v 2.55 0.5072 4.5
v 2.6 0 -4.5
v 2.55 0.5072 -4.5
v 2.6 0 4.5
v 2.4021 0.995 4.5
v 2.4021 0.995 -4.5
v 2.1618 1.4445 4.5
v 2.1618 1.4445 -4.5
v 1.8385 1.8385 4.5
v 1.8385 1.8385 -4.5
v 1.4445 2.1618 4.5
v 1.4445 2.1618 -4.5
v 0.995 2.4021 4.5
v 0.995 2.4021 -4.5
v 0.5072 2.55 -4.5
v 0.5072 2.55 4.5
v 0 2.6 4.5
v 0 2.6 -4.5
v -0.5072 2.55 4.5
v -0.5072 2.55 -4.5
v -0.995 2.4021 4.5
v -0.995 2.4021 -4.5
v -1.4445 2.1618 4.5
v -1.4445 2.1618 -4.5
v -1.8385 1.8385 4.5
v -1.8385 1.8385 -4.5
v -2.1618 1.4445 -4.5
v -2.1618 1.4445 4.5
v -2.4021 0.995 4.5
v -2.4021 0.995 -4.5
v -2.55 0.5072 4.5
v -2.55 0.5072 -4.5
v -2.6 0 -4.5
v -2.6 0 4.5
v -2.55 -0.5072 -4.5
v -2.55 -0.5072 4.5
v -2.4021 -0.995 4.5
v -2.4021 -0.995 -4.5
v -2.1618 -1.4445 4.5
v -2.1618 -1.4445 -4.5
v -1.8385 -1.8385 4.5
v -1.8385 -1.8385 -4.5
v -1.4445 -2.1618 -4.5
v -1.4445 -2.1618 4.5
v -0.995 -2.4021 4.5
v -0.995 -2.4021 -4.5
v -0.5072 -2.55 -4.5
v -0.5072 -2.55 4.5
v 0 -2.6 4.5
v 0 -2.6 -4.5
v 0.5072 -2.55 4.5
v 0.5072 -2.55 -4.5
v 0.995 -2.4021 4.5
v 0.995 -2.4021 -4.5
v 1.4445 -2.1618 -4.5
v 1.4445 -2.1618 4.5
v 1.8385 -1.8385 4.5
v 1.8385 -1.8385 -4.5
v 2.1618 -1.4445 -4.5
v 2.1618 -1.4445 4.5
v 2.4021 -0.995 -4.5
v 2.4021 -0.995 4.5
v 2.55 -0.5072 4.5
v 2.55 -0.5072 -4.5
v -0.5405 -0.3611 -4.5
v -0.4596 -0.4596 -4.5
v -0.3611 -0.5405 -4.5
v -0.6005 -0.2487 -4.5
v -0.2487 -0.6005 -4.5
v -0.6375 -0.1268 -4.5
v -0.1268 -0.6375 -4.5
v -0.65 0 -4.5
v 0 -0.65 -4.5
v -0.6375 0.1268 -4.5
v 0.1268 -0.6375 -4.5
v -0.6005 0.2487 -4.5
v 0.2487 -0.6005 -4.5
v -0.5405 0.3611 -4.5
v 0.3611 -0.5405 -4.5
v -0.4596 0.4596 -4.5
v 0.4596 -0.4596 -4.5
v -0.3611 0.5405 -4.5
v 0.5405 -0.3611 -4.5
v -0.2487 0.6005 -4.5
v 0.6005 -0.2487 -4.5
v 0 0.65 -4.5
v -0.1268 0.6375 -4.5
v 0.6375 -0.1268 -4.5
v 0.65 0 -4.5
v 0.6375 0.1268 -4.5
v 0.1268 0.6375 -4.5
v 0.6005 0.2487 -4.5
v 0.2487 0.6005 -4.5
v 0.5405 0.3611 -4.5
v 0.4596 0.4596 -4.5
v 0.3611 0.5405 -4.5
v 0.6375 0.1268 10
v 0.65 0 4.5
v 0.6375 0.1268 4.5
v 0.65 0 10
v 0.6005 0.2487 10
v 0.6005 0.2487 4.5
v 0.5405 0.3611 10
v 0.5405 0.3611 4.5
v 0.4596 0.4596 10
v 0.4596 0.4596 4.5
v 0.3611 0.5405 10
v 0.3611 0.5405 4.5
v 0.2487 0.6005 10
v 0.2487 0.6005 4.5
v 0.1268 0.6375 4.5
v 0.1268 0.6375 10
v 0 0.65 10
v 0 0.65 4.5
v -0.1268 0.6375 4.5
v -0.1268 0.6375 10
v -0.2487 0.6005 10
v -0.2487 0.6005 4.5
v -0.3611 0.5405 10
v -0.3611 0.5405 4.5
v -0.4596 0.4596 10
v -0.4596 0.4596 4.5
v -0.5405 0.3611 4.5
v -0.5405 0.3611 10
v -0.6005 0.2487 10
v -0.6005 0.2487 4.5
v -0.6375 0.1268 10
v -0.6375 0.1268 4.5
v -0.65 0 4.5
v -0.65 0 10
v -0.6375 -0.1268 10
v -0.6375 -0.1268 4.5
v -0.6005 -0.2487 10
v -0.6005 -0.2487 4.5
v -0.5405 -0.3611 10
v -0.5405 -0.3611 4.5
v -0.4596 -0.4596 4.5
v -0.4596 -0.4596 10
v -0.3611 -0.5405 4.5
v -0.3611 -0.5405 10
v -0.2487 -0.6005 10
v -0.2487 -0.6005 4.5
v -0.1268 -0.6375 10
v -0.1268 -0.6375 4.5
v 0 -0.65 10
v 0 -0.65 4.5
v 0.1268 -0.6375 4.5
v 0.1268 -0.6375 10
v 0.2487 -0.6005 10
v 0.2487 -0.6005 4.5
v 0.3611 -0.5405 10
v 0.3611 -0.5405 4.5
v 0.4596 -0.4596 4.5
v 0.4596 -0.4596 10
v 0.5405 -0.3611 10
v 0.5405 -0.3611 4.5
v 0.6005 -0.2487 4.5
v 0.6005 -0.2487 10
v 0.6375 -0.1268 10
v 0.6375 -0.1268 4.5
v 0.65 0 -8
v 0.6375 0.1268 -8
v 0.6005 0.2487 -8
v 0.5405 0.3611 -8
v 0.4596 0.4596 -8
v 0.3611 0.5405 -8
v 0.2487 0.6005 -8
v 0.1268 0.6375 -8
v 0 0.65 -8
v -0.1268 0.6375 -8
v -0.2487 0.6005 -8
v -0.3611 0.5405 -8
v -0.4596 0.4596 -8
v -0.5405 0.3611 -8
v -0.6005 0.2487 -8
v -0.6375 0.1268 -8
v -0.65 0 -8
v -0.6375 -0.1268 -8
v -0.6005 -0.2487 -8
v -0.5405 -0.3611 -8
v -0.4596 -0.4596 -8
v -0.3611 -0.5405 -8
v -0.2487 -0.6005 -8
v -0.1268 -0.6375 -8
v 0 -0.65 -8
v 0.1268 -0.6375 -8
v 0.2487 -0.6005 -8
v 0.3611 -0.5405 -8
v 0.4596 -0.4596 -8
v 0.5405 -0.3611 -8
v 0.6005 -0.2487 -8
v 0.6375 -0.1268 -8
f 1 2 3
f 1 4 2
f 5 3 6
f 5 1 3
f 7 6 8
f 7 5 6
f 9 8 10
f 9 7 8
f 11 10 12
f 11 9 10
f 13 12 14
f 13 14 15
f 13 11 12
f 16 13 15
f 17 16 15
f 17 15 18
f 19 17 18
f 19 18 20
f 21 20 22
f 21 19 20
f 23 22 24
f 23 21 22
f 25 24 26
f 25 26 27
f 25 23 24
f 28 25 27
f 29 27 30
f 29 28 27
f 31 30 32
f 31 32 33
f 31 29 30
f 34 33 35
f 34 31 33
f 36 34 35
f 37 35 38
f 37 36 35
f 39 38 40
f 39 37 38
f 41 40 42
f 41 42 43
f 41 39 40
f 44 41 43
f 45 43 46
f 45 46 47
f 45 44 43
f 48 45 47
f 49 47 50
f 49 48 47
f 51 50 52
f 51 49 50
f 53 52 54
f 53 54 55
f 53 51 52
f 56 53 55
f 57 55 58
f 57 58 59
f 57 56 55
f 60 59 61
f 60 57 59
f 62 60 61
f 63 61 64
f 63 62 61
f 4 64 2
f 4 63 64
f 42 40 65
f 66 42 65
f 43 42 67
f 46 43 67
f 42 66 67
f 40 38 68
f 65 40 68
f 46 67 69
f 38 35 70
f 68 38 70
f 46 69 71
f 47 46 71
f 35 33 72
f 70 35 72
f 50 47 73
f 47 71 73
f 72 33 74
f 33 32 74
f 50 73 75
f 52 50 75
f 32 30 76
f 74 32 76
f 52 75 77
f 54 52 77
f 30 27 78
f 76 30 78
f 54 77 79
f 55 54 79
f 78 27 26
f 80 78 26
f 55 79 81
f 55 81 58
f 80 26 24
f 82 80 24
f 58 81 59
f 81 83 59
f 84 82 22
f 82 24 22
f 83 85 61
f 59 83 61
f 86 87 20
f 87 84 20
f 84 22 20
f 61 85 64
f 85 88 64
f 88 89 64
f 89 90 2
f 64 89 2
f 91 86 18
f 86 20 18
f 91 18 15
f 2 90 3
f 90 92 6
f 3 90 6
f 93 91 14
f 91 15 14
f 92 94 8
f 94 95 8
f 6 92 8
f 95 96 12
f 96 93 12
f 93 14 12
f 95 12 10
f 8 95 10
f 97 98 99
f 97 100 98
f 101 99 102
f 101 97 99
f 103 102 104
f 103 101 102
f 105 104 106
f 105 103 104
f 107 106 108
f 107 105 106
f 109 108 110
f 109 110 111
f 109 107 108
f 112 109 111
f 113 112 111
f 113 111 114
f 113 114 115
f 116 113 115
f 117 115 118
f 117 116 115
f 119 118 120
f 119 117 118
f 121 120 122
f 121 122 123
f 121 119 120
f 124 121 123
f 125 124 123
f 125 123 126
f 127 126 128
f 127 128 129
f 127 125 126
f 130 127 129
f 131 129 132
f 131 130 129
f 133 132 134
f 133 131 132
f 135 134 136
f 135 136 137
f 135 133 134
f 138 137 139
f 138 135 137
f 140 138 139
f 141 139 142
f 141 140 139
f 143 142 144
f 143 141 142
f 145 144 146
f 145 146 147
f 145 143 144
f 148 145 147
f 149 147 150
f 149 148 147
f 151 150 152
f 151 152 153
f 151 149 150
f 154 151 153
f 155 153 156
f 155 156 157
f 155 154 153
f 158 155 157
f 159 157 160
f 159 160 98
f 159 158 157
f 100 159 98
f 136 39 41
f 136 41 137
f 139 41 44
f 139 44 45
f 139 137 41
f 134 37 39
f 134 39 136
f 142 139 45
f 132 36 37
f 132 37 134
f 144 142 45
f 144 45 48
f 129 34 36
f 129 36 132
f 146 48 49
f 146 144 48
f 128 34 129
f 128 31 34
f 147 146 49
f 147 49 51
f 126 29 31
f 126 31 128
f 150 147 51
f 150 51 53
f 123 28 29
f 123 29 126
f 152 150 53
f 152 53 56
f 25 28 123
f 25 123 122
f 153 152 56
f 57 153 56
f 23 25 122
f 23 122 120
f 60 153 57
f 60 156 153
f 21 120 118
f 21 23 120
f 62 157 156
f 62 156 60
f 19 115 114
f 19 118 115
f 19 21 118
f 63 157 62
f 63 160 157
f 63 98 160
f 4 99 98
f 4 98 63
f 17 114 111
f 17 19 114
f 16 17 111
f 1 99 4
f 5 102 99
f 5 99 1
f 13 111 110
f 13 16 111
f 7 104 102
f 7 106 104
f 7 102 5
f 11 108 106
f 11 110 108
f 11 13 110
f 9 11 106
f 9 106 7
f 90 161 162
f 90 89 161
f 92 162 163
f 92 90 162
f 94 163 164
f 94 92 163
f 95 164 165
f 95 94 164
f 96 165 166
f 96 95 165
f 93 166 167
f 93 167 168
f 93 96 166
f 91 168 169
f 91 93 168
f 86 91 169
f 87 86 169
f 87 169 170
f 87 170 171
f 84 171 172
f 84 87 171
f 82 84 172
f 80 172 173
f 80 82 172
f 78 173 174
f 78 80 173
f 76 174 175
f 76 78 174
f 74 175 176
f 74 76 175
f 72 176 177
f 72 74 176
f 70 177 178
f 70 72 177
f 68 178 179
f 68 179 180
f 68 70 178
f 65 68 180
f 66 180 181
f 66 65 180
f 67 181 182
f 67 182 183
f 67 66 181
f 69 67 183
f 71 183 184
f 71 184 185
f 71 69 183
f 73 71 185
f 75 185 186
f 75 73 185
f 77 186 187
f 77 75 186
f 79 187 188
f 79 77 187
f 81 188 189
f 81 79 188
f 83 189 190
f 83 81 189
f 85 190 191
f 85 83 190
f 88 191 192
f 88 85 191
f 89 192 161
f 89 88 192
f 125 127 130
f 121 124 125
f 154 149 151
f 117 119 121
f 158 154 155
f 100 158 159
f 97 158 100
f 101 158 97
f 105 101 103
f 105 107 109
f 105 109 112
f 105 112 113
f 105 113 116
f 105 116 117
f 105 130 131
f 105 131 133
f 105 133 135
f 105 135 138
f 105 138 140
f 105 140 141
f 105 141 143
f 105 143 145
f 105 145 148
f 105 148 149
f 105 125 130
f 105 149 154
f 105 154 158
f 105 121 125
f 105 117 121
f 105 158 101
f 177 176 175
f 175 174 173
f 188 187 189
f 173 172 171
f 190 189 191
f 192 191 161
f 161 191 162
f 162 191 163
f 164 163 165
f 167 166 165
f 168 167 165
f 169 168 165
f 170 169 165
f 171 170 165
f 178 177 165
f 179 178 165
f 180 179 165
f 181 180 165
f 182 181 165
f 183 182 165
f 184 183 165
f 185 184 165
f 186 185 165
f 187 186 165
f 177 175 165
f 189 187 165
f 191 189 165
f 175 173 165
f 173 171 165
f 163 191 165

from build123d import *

# Parameters (mm, degrees)
SKETCH_1_R           = 0.65
EXTRUDE_1_DEPTH      = 10
EXTRUDE_1_DEPTH_BACK = 8
SKETCH_2_R           = 2.6
EXTRUDE_3_DEPTH      = 4.5
EXTRUDE_3_DEPTH_BACK = 4.5


with BuildPart() as part:
    # Эскиз1 → Бобышка-Вытянуть1 (new body, two sides)
    with BuildSketch(Plane.XY) as extrude_1_sk:
        Circle(SKETCH_1_R)
    extrude(amount=EXTRUDE_1_DEPTH)
    extrude(extrude_1_sk.sketch, amount=-EXTRUDE_1_DEPTH_BACK)

    # Эскиз2 → Бобышка-Вытянуть3 (add, two sides)
    with BuildSketch(Plane.XY) as extrude_3_sk:
        Circle(SKETCH_2_R)
    extrude(amount=EXTRUDE_3_DEPTH)
    extrude(extrude_3_sk.sketch, amount=-EXTRUDE_3_DEPTH_BACK)


solid = part.part
